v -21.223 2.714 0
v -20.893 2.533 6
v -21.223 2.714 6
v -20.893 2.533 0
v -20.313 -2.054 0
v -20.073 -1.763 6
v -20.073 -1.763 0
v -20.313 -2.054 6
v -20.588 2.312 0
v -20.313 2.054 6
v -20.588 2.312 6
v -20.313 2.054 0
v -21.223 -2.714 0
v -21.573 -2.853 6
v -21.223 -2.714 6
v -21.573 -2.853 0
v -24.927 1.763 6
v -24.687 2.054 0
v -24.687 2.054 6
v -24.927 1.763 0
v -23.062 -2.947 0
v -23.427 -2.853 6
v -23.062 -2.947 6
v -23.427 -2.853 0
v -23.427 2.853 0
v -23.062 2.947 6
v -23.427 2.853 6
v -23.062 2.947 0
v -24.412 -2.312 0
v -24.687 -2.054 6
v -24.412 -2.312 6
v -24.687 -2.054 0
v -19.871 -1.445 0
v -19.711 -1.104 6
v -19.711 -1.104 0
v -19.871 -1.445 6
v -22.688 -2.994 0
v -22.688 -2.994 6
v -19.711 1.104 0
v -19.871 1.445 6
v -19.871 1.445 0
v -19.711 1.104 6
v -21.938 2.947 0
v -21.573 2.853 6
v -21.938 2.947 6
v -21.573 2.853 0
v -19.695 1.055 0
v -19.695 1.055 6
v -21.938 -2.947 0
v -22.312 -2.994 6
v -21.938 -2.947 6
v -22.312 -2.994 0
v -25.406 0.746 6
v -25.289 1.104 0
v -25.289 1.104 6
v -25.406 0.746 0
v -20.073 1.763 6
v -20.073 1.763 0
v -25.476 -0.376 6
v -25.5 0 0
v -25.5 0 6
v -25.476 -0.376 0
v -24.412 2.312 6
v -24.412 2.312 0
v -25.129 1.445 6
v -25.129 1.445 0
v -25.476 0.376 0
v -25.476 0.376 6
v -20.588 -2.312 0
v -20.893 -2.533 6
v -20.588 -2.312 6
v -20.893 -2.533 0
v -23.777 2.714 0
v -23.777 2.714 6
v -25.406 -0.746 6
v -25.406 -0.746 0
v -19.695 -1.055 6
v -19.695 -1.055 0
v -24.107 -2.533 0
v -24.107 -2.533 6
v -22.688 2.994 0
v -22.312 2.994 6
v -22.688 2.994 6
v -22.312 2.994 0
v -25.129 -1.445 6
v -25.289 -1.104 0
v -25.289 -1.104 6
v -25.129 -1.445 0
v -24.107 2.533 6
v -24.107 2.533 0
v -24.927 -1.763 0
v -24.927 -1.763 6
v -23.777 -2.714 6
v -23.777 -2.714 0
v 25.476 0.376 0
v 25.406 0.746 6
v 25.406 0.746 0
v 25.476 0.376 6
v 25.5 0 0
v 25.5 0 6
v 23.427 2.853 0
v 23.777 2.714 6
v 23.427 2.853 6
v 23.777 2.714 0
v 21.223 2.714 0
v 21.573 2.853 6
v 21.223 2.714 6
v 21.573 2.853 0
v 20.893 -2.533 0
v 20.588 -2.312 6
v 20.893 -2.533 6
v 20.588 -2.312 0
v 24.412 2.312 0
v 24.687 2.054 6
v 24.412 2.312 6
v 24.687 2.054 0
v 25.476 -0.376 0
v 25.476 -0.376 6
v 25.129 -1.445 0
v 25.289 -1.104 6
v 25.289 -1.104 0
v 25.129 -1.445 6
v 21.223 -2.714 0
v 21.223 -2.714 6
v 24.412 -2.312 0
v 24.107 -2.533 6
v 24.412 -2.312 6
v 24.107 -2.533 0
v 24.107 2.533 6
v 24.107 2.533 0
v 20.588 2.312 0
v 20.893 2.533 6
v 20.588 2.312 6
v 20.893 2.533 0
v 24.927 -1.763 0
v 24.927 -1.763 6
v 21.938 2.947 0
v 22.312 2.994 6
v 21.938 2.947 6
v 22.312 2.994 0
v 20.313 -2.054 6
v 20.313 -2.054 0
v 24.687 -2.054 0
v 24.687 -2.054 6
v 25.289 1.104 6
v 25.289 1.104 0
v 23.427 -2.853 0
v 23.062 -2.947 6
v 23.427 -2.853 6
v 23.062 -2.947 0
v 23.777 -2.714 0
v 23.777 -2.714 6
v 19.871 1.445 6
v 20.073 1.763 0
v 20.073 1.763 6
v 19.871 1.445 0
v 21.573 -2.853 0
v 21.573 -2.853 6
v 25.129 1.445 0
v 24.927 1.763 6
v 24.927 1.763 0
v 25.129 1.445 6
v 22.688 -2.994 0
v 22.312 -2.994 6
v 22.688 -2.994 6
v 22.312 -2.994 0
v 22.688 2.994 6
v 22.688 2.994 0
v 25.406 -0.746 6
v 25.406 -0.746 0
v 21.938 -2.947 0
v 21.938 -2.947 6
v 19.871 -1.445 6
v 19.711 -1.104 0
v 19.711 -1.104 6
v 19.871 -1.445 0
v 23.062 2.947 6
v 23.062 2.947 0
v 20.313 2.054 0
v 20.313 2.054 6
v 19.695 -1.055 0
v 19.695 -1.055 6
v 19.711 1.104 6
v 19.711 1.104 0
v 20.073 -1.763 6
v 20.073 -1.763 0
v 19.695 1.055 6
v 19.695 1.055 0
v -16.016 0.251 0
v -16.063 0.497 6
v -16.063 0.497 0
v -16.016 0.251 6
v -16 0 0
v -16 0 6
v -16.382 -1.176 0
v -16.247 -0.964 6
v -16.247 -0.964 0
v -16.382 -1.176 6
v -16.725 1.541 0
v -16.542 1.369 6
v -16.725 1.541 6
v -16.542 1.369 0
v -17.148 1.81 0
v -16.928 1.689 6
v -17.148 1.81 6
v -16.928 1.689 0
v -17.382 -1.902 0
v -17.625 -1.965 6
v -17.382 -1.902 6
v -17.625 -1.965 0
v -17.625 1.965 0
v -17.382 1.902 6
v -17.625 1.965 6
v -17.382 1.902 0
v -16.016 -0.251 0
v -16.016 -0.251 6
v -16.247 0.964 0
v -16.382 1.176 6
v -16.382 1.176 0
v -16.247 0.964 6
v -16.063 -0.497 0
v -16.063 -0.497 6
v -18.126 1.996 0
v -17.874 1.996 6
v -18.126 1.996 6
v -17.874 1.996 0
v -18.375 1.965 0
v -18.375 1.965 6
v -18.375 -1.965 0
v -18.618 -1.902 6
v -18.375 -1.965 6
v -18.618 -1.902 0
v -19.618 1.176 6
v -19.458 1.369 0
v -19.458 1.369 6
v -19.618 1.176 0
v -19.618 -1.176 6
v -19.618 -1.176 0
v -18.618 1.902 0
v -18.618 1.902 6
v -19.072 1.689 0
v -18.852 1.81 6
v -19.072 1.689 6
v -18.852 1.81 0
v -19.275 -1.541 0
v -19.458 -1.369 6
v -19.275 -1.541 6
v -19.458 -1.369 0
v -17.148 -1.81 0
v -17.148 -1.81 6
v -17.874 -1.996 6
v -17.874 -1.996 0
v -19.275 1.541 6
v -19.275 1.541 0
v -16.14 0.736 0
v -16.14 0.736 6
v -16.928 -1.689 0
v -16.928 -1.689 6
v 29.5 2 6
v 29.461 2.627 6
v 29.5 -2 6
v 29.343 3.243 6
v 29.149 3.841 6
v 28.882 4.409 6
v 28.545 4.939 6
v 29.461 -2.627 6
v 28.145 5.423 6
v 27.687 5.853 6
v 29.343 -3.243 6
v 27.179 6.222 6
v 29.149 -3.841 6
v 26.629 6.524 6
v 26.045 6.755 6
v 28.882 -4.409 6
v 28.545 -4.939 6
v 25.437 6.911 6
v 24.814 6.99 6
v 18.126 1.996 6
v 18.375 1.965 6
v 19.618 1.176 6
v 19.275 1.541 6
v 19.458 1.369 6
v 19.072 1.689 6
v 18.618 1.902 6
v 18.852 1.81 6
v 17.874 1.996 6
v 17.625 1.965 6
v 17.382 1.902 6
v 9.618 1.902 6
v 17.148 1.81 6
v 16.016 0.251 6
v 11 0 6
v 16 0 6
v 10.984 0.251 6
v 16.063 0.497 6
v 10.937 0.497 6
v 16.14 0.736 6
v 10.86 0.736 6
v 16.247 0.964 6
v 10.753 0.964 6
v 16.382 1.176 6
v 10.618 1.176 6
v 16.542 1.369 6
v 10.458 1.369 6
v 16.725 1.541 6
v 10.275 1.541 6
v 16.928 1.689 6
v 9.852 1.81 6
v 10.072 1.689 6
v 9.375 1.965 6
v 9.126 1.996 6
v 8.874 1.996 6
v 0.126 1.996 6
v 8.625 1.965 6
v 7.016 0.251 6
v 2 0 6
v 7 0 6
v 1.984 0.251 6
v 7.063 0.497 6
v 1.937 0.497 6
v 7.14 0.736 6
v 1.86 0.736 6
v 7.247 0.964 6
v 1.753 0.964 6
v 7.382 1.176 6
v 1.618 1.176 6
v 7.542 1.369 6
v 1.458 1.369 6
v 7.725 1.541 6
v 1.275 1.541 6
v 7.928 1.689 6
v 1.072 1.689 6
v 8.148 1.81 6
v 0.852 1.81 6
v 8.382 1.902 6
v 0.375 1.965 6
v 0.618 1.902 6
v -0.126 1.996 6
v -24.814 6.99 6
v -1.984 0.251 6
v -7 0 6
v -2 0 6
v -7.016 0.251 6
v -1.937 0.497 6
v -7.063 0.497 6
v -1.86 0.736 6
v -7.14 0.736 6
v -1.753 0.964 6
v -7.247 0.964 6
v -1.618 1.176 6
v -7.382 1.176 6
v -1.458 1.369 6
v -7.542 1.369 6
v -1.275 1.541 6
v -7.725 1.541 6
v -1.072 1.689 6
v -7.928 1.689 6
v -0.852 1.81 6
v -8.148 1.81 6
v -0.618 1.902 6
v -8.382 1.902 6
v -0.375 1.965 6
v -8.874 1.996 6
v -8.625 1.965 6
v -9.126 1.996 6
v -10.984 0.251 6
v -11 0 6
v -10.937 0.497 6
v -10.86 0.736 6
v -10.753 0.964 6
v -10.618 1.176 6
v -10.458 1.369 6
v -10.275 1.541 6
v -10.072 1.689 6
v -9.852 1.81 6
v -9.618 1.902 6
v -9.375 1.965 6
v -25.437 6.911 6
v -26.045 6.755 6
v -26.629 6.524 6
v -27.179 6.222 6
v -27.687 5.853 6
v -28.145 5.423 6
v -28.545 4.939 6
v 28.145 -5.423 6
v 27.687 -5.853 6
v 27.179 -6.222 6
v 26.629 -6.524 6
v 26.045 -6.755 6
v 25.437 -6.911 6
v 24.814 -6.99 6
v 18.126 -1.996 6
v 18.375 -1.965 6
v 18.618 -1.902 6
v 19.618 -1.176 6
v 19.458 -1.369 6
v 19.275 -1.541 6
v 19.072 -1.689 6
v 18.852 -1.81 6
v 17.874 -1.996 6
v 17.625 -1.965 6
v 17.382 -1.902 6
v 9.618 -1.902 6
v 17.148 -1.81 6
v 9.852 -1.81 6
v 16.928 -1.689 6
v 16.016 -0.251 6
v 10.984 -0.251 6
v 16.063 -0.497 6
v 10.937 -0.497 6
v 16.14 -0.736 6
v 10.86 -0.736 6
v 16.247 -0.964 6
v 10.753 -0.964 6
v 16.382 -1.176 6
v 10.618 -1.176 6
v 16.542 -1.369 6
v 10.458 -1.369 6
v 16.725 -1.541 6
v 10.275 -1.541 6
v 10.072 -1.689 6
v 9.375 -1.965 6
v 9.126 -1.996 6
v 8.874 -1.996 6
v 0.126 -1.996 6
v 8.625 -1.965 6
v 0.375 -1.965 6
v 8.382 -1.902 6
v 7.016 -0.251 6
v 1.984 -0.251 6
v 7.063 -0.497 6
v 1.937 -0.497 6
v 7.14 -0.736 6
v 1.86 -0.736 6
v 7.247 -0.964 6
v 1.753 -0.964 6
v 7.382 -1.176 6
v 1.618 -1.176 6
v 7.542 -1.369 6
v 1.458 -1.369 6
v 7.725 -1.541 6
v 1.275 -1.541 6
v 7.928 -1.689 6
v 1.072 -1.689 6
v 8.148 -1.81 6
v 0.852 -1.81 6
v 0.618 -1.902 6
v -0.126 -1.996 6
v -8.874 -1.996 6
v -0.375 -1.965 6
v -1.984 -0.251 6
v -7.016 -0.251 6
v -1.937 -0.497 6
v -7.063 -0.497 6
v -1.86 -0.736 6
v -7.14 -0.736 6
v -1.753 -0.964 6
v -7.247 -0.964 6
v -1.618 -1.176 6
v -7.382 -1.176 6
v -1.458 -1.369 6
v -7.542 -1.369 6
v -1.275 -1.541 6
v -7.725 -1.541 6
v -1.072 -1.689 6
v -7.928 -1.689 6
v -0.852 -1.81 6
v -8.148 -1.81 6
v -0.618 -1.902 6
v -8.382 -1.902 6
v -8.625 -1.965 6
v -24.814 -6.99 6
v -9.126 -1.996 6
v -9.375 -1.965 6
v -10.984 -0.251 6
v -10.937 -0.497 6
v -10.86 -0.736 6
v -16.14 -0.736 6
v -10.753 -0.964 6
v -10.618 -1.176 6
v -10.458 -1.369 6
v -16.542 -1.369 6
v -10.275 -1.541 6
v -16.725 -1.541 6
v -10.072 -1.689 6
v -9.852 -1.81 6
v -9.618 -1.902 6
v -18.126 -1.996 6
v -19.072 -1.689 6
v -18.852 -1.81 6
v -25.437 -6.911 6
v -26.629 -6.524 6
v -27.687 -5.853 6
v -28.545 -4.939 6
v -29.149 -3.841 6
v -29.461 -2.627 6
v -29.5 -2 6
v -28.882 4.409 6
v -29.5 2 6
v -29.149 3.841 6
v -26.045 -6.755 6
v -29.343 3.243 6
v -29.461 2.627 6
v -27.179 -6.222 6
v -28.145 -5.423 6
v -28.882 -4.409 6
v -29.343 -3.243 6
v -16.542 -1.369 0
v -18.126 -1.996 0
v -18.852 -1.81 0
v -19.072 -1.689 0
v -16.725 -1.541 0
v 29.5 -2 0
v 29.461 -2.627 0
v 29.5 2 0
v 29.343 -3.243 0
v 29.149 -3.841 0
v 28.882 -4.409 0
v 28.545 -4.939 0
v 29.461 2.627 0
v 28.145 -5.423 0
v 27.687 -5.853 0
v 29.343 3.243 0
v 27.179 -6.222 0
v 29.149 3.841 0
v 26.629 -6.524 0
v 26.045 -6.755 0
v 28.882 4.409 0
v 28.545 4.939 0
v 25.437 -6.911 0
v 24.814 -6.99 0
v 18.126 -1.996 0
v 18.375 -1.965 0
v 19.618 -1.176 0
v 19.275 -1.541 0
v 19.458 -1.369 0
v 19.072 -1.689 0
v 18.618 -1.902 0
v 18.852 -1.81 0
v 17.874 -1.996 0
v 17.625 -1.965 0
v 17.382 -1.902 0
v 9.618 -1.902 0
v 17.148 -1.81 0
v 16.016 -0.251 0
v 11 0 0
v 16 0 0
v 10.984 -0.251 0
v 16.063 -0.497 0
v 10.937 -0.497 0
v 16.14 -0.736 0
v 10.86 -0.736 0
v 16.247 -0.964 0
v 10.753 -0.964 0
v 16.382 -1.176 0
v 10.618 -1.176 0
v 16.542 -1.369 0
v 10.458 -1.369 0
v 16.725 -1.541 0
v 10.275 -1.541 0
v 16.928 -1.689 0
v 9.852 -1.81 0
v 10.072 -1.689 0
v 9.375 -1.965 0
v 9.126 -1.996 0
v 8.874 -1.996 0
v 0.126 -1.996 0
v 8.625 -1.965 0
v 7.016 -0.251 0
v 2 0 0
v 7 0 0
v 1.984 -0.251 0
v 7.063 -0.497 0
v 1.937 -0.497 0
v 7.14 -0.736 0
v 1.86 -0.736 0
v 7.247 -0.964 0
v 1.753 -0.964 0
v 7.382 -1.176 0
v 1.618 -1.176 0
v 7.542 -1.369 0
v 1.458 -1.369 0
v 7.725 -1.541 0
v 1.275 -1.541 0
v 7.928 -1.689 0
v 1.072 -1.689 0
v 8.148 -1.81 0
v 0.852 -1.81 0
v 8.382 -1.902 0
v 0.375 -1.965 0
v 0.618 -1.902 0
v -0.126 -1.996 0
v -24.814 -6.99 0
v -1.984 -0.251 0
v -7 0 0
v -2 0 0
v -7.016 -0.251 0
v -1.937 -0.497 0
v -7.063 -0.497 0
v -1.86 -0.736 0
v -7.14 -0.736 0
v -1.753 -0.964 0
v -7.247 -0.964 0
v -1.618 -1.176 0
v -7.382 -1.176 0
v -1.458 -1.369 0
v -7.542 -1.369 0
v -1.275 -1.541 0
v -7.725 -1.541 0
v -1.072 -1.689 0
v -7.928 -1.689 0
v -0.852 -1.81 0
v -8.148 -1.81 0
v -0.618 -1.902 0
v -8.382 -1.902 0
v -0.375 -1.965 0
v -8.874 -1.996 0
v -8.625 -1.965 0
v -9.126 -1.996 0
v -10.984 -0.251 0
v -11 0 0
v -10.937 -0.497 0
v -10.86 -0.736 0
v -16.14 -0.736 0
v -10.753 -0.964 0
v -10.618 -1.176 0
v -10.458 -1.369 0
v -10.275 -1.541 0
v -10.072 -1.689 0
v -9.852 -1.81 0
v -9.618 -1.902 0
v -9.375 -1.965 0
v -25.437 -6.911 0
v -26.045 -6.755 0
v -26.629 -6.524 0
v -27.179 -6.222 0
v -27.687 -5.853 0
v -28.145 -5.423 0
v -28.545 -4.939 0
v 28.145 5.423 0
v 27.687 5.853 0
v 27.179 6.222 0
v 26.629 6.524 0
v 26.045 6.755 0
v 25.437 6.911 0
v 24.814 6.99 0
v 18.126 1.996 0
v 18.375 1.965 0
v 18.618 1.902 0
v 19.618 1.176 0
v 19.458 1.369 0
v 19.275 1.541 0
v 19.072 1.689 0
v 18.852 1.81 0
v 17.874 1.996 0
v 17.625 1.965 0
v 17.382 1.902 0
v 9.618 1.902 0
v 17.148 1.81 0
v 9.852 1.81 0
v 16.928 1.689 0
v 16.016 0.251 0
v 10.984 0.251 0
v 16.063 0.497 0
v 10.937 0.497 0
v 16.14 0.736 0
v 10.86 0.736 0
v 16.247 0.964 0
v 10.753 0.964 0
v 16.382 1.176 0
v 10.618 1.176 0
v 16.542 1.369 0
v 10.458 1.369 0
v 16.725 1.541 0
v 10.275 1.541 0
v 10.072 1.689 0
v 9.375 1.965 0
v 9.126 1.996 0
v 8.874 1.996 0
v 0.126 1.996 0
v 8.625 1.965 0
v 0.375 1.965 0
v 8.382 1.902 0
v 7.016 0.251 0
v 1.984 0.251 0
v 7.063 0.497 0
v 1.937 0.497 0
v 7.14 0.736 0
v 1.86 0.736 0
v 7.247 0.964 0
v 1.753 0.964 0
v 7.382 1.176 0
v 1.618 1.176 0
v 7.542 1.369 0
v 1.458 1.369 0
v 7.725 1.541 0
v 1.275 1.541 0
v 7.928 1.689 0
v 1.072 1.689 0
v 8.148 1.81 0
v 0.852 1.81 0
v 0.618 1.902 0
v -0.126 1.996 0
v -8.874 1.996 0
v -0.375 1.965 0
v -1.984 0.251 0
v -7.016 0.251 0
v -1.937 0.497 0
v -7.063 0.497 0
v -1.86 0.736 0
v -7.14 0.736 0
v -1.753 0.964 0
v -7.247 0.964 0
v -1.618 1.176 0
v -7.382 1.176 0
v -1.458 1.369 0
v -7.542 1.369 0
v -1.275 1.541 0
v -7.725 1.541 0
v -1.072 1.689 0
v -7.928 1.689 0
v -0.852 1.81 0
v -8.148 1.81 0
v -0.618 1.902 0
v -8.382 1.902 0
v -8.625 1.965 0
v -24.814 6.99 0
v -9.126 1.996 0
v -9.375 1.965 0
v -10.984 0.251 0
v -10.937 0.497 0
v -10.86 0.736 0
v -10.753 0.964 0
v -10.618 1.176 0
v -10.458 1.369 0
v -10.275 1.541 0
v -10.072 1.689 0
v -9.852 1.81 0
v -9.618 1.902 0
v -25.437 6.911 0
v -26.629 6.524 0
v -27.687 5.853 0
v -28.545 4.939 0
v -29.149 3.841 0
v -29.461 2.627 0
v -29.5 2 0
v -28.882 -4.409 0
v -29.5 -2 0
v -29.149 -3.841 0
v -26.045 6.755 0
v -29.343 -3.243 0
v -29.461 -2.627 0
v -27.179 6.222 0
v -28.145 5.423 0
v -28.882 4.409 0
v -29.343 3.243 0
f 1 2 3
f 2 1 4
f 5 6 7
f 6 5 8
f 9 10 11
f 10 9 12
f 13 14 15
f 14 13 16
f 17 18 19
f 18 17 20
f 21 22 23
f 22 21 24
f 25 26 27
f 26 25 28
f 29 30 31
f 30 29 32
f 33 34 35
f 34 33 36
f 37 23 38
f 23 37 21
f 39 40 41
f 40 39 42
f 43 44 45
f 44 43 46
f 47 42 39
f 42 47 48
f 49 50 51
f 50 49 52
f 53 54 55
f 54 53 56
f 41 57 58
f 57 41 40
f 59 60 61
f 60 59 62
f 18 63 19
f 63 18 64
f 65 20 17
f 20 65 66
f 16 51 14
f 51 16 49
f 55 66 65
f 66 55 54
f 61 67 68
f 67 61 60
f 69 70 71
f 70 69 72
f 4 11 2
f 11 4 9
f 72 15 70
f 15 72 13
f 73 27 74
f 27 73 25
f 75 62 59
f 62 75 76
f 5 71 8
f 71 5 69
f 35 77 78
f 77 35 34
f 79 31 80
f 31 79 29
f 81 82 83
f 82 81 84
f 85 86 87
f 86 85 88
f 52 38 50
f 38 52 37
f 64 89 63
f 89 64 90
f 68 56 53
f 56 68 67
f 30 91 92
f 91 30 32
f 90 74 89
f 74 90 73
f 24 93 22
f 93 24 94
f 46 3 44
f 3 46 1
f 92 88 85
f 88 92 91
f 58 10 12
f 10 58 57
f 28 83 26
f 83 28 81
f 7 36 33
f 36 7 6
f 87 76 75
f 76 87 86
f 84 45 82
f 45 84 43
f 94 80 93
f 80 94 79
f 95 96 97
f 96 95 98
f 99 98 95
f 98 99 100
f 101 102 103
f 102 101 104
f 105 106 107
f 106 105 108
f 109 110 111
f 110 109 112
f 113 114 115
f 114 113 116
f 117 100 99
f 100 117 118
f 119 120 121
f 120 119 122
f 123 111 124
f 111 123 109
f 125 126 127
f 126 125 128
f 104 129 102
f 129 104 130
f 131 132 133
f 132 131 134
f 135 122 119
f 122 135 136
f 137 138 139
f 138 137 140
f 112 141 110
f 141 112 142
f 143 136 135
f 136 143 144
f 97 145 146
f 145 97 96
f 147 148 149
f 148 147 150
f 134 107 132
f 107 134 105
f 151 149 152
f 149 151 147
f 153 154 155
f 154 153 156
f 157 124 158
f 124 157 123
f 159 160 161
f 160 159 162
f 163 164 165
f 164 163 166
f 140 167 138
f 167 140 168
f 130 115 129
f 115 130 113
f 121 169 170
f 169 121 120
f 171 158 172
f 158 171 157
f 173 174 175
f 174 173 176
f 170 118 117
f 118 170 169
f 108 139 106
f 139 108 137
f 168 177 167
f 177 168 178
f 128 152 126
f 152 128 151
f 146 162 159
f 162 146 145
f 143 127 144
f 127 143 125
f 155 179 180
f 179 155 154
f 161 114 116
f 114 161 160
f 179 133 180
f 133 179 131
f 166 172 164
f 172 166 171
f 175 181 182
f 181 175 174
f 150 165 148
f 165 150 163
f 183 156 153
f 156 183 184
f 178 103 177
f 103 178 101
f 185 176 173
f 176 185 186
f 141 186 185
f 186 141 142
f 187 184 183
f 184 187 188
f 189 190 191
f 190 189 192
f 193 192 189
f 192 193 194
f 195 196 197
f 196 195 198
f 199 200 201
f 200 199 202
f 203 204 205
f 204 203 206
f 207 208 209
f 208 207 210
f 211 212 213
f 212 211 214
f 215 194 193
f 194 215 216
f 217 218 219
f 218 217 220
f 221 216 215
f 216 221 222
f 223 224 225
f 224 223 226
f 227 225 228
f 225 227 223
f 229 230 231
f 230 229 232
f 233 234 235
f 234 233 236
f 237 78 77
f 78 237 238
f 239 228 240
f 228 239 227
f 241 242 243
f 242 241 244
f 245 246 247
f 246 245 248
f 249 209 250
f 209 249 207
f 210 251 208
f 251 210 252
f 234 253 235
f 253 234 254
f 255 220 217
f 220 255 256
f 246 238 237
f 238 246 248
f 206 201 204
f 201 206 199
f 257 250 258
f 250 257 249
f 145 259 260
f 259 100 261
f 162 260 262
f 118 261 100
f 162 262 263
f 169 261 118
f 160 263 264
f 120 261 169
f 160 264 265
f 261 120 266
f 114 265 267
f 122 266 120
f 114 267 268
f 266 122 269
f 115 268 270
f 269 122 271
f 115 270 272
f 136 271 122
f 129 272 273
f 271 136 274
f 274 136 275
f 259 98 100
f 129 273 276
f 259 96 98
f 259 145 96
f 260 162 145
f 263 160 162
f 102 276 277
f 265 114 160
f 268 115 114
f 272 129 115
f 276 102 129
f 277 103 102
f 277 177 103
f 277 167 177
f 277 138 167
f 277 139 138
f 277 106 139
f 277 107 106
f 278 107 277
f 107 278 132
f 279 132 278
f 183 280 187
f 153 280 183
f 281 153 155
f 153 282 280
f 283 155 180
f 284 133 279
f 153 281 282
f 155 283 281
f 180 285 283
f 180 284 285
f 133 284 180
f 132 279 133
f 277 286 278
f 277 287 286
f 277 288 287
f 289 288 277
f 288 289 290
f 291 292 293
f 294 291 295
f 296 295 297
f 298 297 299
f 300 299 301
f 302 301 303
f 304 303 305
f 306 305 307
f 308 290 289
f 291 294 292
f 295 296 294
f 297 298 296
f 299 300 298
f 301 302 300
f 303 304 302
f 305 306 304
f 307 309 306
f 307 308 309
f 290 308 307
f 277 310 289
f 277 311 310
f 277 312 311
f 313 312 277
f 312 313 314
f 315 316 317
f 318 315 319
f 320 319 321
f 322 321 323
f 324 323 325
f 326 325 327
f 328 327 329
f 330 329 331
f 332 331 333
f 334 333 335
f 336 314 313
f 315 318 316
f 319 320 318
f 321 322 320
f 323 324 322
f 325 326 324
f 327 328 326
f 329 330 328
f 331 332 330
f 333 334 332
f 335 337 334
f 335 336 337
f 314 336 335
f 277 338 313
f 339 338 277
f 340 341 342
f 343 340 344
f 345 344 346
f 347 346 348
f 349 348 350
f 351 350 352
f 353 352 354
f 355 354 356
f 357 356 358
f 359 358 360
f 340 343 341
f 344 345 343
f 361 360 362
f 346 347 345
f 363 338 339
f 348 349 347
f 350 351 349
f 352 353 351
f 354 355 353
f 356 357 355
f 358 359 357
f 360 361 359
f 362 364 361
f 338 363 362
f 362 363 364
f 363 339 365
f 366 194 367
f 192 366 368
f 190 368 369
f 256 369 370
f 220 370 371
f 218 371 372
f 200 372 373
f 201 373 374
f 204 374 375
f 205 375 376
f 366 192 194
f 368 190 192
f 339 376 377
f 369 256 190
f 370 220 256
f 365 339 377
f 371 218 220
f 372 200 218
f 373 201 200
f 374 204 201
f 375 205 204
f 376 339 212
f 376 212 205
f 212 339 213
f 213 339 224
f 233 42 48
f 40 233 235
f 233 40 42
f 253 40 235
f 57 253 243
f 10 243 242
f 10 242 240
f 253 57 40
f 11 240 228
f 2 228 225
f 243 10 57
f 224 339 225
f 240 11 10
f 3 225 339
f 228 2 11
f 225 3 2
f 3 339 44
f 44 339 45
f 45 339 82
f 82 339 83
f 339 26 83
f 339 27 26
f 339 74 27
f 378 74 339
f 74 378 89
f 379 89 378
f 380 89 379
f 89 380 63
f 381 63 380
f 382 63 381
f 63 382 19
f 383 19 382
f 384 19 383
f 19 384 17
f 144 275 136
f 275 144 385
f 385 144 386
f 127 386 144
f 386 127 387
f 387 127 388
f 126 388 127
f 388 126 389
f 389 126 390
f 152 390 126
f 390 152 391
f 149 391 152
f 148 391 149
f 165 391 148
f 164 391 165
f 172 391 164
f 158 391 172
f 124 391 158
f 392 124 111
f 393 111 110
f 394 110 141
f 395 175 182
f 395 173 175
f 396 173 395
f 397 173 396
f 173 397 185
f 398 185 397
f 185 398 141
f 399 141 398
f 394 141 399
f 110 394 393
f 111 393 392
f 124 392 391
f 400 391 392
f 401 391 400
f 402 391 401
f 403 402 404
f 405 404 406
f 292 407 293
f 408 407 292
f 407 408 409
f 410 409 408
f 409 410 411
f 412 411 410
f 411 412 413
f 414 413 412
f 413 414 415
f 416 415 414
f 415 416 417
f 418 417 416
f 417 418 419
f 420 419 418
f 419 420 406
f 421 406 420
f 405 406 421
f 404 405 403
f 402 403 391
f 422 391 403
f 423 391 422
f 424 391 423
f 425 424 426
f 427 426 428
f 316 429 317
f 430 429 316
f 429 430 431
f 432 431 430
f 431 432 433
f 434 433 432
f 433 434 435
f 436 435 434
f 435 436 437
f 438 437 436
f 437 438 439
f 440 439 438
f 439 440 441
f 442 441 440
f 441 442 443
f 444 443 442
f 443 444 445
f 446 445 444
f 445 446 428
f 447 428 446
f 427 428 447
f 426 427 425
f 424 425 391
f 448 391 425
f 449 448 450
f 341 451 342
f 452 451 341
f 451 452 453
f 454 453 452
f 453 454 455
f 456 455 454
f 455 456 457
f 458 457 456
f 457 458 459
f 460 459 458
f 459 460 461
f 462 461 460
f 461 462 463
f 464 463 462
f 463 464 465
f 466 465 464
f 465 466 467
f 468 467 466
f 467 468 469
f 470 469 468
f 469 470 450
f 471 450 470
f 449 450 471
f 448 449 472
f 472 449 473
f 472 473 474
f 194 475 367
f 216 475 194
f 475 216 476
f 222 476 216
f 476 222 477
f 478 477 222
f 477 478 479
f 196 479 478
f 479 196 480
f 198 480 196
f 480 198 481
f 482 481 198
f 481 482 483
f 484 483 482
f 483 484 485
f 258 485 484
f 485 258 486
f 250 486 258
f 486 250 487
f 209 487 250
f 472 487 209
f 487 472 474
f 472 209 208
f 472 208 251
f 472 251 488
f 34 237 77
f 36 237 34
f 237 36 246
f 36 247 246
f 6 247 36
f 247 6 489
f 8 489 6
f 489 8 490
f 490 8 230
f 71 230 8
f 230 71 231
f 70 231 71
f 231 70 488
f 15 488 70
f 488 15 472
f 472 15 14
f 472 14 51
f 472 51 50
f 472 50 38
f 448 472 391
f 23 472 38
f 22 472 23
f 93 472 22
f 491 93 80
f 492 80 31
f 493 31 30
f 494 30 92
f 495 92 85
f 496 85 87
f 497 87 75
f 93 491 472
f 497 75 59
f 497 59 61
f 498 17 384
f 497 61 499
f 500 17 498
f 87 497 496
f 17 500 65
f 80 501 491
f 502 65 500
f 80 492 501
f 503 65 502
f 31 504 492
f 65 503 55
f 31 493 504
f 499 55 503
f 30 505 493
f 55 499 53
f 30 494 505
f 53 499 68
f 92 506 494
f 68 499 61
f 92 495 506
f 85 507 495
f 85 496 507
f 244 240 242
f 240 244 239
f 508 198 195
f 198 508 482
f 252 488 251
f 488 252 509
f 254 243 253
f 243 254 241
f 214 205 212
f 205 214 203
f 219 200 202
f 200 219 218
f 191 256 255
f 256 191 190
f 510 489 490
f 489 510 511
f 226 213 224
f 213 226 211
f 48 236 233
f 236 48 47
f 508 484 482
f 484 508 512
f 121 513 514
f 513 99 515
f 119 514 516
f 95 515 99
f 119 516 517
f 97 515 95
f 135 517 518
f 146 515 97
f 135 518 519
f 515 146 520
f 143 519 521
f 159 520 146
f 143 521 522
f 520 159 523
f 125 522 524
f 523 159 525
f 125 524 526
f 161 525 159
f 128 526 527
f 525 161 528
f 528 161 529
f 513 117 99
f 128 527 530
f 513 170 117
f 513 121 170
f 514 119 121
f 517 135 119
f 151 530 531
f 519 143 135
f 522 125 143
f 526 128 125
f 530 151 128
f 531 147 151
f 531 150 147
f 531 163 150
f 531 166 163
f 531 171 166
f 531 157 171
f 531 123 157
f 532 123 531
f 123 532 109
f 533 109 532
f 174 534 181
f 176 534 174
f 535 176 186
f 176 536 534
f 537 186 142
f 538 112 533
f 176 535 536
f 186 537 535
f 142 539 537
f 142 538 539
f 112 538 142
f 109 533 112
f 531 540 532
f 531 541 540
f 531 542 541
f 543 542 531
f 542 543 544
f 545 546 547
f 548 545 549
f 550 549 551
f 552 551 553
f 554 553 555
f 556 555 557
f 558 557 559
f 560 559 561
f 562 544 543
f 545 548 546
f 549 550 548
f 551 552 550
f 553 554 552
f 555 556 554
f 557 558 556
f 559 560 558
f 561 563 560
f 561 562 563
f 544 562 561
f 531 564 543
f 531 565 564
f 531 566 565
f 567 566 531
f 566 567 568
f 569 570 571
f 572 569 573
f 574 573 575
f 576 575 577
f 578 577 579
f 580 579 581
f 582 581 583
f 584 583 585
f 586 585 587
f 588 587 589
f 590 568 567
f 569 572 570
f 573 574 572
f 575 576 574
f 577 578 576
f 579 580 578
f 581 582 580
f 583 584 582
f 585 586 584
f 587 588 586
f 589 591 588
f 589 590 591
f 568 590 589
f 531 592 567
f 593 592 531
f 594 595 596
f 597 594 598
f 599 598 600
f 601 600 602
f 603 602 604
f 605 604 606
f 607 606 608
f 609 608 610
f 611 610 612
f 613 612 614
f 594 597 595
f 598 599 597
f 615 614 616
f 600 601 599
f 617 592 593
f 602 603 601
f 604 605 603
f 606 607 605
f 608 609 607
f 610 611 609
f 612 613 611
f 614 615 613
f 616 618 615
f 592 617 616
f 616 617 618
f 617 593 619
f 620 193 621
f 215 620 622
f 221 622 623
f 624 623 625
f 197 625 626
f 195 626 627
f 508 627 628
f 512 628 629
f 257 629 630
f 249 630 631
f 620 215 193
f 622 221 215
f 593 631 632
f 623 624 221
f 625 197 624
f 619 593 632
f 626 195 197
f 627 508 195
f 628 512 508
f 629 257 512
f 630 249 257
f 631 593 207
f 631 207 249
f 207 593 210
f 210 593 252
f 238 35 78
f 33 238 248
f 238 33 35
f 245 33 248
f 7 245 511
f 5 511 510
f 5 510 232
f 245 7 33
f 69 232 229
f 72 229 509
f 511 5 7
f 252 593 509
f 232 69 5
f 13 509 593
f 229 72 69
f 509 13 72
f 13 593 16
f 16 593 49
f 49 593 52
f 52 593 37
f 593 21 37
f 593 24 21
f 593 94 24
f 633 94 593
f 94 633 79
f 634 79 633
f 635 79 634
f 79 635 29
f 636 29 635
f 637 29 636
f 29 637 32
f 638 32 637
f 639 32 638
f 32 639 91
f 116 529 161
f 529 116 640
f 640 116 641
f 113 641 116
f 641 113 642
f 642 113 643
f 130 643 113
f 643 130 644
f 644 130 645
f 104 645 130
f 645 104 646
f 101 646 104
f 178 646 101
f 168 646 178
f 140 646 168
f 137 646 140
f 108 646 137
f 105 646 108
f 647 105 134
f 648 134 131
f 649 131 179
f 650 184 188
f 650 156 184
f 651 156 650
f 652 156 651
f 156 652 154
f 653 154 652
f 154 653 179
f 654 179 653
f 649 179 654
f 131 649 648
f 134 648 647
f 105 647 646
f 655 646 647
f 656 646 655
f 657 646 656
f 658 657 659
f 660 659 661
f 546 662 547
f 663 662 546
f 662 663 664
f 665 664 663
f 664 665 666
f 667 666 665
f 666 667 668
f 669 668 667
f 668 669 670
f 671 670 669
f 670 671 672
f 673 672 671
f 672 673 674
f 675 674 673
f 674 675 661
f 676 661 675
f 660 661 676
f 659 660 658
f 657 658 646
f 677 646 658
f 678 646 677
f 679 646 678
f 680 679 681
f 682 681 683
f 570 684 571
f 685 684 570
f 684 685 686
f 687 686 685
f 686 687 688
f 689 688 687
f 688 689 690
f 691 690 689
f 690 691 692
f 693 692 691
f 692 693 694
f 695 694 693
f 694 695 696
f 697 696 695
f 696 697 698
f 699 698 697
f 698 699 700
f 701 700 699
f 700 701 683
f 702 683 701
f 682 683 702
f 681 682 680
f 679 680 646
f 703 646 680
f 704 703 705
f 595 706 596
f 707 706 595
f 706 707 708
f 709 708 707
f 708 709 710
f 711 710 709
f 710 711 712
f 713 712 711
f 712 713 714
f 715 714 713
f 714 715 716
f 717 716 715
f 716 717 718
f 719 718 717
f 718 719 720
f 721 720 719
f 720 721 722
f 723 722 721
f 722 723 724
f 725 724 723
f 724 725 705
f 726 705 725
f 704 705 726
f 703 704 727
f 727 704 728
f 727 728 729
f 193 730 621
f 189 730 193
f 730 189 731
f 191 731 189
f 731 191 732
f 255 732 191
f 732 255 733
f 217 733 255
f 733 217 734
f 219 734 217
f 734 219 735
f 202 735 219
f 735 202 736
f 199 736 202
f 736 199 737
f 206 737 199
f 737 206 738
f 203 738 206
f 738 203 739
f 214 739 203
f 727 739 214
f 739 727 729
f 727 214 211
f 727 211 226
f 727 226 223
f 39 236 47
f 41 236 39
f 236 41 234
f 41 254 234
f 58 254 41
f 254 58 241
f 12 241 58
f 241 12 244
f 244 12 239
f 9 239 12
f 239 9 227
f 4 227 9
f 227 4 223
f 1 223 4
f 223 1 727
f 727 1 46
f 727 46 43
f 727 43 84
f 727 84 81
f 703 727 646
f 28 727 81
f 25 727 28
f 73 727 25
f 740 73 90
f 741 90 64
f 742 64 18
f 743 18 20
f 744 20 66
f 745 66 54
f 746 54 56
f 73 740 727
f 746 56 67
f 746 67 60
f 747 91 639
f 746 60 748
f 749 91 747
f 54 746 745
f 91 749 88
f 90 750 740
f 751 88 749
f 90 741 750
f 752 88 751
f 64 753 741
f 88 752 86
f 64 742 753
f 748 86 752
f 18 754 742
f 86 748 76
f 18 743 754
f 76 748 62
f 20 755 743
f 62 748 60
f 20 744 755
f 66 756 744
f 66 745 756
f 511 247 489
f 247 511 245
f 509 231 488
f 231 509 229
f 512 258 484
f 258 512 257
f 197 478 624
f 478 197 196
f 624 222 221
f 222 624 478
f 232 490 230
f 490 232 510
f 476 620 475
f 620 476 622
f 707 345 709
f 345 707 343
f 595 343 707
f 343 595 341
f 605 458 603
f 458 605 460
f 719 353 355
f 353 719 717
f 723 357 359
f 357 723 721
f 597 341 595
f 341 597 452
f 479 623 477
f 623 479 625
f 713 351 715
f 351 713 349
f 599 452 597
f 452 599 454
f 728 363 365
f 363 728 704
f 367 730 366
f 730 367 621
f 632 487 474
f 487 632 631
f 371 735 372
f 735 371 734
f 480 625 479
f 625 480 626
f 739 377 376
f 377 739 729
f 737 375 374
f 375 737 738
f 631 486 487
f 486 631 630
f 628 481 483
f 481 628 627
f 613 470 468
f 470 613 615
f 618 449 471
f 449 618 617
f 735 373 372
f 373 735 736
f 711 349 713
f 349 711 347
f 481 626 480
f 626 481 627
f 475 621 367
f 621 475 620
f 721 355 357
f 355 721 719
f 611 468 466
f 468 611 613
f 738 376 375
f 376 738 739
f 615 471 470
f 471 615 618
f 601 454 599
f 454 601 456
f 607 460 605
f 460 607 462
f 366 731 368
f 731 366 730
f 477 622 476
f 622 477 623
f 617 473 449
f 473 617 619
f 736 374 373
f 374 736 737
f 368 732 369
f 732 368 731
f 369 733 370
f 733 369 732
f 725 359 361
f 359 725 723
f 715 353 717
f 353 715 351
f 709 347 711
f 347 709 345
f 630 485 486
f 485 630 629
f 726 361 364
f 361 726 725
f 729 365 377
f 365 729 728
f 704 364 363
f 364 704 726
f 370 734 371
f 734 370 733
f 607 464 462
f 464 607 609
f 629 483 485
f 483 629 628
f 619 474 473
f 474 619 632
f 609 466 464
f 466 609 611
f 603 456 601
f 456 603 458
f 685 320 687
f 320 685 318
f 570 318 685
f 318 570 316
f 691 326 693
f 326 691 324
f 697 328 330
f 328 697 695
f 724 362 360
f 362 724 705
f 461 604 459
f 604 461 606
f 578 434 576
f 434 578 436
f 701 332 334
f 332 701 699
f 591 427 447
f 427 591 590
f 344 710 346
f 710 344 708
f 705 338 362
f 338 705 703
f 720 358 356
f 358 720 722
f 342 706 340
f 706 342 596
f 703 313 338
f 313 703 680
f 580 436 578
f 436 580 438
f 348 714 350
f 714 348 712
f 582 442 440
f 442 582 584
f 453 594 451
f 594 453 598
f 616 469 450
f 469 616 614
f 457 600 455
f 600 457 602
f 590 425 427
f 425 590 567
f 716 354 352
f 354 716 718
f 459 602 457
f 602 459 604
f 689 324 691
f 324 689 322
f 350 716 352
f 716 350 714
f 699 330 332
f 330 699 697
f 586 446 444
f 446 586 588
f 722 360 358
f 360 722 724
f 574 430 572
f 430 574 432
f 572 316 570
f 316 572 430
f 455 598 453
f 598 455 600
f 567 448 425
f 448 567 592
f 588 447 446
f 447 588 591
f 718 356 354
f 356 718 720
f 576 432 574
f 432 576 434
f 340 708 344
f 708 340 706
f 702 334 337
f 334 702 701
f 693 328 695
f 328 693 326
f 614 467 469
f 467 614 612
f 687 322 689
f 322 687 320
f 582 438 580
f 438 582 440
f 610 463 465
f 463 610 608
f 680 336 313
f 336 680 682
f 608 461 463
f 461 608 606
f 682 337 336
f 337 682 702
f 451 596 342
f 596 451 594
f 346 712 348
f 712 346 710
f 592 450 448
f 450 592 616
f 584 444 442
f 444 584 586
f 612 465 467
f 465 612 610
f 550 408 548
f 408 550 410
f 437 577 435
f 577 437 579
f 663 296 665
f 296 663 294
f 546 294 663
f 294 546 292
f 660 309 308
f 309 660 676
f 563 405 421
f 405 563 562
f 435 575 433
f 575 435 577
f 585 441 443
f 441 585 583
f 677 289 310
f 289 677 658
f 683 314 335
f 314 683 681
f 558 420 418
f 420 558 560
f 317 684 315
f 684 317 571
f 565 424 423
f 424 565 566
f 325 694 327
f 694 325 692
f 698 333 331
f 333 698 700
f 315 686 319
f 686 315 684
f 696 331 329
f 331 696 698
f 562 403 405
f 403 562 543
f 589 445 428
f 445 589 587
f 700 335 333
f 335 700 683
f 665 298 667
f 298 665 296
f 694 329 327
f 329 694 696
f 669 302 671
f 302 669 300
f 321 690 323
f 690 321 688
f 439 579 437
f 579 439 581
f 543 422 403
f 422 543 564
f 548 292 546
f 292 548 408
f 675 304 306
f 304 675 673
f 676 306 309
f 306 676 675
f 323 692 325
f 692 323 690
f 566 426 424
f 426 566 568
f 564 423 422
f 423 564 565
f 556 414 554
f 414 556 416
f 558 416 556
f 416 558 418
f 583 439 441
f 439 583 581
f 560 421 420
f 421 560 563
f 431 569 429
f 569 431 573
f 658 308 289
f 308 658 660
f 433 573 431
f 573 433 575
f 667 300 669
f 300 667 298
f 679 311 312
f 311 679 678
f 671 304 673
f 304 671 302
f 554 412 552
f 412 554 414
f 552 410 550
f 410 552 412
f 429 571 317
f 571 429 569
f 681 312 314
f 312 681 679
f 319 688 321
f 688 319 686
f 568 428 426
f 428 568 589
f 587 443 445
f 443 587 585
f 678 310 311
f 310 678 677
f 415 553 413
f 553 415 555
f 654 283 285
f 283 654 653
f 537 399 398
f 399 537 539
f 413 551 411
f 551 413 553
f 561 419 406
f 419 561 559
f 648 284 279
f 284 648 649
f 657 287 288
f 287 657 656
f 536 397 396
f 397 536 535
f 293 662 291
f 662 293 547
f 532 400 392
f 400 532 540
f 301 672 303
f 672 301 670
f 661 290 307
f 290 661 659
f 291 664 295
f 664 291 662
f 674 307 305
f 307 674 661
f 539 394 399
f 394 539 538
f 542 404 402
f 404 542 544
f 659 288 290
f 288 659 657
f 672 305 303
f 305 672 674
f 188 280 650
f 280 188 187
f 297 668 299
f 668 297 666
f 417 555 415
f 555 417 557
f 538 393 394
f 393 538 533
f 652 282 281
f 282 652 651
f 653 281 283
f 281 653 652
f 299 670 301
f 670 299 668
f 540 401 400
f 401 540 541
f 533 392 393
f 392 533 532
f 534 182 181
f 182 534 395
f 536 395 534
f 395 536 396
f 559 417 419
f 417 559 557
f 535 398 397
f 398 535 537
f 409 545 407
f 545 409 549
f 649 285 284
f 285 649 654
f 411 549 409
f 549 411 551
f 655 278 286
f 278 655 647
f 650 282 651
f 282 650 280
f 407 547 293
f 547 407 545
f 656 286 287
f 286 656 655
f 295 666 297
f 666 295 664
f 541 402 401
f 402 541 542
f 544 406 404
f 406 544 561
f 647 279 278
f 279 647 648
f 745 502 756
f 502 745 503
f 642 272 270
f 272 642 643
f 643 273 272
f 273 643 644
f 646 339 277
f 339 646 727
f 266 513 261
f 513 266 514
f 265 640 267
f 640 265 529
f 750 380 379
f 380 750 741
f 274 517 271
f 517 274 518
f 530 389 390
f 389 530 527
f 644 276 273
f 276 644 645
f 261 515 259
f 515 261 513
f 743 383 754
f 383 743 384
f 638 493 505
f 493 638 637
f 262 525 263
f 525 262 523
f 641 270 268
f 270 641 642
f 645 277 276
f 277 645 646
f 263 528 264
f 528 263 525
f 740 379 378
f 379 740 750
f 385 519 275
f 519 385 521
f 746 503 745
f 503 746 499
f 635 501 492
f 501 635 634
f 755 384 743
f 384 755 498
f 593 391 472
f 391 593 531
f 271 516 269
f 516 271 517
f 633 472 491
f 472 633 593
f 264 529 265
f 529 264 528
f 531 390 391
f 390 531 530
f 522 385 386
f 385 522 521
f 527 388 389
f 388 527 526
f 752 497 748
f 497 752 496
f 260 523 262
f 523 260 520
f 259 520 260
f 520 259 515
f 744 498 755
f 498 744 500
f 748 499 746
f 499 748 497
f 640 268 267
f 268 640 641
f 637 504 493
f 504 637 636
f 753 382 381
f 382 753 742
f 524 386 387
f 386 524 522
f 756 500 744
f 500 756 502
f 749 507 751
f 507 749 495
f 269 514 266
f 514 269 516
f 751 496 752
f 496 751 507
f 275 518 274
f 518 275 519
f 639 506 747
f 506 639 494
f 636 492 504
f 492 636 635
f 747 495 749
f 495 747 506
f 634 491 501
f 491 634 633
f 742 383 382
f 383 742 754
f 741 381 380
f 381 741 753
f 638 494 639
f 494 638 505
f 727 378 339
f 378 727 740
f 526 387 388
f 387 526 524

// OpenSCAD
$fn = 50;


difference() {
	union() {
		hull() {
			translate(v = [-24.5000000000, 2.0000000000, 0]) {
				cylinder(h = 6, r = 5);
			}
			translate(v = [24.5000000000, 2.0000000000, 0]) {
				cylinder(h = 6, r = 5);
			}
			translate(v = [-24.5000000000, -2.0000000000, 0]) {
				cylinder(h = 6, r = 5);
			}
			translate(v = [24.5000000000, -2.0000000000, 0]) {
				cylinder(h = 6, r = 5);
			}
		}
	}
	union() {
		#translate(v = [-22.5000000000, 0.0000000000, -100.0000000000]) {
			cylinder(h = 200, r = 3.0000000000);
		}
		#translate(v = [-22.5000000000, 0.0000000000, -100.0000000000]) {
			cylinder(h = 200, r = 3.0000000000);
		}
		#translate(v = [22.5000000000, 0.0000000000, -100.0000000000]) {
			cylinder(h = 200, r = 3.0000000000);
		}
		#translate(v = [22.5000000000, 0.0000000000, -100.0000000000]) {
			cylinder(h = 200, r = 3.0000000000);
		}
		#translate(v = [-18.0000000000, 0, 0]) {
			cylinder(h = 6, r = 2.0000000000);
		}
		#translate(v = [-9.0000000000, 0, 0]) {
			cylinder(h = 6, r = 2.0000000000);
		}
		#cylinder(h = 6, r = 2.0000000000);
		#translate(v = [9.0000000000, 0, 0]) {
			cylinder(h = 6, r = 2.0000000000);
		}
		#translate(v = [18.0000000000, 0, 0]) {
			cylinder(h = 6, r = 2.0000000000);
		}
	}
}
